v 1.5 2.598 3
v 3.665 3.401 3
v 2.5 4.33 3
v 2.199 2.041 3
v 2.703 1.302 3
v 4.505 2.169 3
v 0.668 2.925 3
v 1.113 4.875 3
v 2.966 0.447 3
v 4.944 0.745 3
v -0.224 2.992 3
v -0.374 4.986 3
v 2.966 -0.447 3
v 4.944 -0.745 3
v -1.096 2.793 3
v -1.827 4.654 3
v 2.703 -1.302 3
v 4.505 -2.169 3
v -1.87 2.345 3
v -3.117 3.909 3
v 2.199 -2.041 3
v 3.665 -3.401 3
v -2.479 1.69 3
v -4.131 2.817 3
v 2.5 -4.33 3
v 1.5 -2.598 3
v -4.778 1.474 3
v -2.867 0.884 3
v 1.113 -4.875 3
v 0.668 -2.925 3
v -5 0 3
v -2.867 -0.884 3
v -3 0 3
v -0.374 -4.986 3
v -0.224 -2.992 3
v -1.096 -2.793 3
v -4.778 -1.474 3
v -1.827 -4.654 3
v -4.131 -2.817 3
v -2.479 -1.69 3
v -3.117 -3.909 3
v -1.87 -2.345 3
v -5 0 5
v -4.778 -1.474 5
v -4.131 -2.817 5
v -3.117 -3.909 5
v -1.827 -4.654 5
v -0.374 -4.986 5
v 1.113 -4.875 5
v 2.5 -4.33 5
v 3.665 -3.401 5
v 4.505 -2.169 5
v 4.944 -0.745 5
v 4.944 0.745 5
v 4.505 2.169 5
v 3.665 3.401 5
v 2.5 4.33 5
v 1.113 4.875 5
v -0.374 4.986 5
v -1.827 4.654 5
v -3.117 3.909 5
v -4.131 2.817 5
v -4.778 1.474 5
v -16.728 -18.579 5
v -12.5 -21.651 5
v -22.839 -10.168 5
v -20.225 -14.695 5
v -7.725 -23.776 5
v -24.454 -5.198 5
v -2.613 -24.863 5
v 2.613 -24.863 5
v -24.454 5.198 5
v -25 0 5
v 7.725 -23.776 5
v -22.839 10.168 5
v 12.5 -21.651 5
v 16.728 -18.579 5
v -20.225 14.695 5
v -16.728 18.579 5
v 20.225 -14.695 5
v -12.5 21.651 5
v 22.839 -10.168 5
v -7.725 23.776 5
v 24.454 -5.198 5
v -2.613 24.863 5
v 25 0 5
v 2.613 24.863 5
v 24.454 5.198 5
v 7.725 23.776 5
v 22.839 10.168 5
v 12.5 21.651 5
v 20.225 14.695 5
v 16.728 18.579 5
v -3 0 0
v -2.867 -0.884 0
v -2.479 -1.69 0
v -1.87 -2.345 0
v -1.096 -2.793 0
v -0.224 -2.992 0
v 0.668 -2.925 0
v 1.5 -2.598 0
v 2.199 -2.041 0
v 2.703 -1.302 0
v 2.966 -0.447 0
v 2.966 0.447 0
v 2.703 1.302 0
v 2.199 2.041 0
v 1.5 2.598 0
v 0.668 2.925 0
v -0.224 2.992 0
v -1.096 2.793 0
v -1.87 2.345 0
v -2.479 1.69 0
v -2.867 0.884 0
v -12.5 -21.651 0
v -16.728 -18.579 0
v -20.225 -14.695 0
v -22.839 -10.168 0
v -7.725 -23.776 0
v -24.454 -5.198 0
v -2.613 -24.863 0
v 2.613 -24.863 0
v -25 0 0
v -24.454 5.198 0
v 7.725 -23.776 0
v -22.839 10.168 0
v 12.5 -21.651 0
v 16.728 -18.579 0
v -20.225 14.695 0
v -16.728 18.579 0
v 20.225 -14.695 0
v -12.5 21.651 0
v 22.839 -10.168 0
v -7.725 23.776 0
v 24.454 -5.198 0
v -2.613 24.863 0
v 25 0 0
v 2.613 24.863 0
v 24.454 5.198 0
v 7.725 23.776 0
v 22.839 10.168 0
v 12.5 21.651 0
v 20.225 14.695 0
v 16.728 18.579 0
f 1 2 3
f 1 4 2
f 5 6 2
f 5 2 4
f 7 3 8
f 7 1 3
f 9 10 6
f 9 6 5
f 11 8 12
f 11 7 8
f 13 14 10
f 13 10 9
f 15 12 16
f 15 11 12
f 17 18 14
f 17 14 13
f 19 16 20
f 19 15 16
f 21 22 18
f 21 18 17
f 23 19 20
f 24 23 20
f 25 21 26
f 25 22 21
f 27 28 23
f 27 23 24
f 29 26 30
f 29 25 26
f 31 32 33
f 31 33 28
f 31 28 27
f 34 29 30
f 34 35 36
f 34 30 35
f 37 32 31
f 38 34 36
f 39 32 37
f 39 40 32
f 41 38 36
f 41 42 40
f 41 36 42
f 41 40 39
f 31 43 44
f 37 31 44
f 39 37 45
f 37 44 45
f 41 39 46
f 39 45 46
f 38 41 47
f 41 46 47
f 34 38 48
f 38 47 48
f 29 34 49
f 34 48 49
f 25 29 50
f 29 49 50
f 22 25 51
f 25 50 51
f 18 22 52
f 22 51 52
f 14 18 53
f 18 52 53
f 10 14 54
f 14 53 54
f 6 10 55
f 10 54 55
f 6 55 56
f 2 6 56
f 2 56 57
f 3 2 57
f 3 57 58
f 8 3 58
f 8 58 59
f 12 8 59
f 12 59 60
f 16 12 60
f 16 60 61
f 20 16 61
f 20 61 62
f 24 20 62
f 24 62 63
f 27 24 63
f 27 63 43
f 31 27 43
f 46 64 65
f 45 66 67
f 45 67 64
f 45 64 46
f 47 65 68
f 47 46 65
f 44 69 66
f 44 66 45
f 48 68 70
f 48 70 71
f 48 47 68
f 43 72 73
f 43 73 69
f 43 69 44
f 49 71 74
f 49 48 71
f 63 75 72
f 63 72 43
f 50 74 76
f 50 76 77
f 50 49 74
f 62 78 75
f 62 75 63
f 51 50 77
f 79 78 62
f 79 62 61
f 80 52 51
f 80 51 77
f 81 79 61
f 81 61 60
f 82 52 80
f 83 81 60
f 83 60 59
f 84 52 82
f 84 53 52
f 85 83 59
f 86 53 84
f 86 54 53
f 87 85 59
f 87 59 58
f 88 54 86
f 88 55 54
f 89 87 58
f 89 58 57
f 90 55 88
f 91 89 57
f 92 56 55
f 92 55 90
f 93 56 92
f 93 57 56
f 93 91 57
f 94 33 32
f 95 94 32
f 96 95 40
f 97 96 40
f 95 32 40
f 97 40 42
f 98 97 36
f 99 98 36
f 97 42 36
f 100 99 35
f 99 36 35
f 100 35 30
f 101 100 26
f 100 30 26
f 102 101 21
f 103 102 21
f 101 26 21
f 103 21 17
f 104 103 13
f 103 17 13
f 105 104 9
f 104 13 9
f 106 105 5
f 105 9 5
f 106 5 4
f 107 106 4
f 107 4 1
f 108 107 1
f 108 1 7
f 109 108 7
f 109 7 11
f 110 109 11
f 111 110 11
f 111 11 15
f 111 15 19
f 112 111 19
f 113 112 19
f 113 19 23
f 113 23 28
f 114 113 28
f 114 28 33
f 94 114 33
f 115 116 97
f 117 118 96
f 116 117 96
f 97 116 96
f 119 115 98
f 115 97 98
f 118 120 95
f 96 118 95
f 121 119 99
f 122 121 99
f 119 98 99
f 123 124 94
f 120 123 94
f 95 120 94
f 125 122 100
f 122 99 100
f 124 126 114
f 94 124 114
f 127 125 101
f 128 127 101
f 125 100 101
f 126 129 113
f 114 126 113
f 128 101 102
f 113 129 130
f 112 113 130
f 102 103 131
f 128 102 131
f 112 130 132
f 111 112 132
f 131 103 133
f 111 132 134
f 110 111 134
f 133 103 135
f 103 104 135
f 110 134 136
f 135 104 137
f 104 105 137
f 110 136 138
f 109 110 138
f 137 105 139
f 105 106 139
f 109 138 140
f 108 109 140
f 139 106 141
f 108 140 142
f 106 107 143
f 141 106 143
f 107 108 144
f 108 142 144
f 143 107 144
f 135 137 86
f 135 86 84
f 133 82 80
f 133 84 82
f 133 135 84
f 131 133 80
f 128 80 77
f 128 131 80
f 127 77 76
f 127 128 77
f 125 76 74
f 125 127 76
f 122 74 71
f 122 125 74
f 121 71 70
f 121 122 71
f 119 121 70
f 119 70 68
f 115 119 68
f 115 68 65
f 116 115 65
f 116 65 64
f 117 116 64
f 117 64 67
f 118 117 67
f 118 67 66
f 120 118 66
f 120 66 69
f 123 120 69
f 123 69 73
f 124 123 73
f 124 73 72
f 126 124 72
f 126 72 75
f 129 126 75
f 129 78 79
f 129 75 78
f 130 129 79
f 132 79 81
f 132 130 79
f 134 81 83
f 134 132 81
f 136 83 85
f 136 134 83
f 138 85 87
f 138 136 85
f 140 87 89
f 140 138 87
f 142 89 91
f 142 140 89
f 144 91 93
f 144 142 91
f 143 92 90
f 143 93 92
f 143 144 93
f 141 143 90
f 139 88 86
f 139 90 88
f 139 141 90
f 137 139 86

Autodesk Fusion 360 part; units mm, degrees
sketch "Sketch1" plane through (0, 0, 0) normal (0, 0, 1) x (1, 0, 0)
  circle A0 centre (0, 0) radius 25
  dimension "d1" = 50
extrude "Extrude1" add sketch "Sketch1" along normal blind 5
sketch "Sketch2" plane through (0, 0, 5) normal (0, 0, 1) x (-1, 0, 0)
  circle A0 centre (0, 0) radius 25
  circle A1 centre (0, 0) radius 5
  dimension "d4" = 10
extrude "Extrude3" cut sketch "Sketch2" against normal blind 2 contours A1
sketch "Sketch3" plane through (0, 0, 5) normal (0, 0, 1) x (-1, 0, 0)
  circle A0 centre (0, 0) radius 3
  dimension "d9" = 6
extrude "Extrude4" cut sketch "Sketch3" against normal blind 5
